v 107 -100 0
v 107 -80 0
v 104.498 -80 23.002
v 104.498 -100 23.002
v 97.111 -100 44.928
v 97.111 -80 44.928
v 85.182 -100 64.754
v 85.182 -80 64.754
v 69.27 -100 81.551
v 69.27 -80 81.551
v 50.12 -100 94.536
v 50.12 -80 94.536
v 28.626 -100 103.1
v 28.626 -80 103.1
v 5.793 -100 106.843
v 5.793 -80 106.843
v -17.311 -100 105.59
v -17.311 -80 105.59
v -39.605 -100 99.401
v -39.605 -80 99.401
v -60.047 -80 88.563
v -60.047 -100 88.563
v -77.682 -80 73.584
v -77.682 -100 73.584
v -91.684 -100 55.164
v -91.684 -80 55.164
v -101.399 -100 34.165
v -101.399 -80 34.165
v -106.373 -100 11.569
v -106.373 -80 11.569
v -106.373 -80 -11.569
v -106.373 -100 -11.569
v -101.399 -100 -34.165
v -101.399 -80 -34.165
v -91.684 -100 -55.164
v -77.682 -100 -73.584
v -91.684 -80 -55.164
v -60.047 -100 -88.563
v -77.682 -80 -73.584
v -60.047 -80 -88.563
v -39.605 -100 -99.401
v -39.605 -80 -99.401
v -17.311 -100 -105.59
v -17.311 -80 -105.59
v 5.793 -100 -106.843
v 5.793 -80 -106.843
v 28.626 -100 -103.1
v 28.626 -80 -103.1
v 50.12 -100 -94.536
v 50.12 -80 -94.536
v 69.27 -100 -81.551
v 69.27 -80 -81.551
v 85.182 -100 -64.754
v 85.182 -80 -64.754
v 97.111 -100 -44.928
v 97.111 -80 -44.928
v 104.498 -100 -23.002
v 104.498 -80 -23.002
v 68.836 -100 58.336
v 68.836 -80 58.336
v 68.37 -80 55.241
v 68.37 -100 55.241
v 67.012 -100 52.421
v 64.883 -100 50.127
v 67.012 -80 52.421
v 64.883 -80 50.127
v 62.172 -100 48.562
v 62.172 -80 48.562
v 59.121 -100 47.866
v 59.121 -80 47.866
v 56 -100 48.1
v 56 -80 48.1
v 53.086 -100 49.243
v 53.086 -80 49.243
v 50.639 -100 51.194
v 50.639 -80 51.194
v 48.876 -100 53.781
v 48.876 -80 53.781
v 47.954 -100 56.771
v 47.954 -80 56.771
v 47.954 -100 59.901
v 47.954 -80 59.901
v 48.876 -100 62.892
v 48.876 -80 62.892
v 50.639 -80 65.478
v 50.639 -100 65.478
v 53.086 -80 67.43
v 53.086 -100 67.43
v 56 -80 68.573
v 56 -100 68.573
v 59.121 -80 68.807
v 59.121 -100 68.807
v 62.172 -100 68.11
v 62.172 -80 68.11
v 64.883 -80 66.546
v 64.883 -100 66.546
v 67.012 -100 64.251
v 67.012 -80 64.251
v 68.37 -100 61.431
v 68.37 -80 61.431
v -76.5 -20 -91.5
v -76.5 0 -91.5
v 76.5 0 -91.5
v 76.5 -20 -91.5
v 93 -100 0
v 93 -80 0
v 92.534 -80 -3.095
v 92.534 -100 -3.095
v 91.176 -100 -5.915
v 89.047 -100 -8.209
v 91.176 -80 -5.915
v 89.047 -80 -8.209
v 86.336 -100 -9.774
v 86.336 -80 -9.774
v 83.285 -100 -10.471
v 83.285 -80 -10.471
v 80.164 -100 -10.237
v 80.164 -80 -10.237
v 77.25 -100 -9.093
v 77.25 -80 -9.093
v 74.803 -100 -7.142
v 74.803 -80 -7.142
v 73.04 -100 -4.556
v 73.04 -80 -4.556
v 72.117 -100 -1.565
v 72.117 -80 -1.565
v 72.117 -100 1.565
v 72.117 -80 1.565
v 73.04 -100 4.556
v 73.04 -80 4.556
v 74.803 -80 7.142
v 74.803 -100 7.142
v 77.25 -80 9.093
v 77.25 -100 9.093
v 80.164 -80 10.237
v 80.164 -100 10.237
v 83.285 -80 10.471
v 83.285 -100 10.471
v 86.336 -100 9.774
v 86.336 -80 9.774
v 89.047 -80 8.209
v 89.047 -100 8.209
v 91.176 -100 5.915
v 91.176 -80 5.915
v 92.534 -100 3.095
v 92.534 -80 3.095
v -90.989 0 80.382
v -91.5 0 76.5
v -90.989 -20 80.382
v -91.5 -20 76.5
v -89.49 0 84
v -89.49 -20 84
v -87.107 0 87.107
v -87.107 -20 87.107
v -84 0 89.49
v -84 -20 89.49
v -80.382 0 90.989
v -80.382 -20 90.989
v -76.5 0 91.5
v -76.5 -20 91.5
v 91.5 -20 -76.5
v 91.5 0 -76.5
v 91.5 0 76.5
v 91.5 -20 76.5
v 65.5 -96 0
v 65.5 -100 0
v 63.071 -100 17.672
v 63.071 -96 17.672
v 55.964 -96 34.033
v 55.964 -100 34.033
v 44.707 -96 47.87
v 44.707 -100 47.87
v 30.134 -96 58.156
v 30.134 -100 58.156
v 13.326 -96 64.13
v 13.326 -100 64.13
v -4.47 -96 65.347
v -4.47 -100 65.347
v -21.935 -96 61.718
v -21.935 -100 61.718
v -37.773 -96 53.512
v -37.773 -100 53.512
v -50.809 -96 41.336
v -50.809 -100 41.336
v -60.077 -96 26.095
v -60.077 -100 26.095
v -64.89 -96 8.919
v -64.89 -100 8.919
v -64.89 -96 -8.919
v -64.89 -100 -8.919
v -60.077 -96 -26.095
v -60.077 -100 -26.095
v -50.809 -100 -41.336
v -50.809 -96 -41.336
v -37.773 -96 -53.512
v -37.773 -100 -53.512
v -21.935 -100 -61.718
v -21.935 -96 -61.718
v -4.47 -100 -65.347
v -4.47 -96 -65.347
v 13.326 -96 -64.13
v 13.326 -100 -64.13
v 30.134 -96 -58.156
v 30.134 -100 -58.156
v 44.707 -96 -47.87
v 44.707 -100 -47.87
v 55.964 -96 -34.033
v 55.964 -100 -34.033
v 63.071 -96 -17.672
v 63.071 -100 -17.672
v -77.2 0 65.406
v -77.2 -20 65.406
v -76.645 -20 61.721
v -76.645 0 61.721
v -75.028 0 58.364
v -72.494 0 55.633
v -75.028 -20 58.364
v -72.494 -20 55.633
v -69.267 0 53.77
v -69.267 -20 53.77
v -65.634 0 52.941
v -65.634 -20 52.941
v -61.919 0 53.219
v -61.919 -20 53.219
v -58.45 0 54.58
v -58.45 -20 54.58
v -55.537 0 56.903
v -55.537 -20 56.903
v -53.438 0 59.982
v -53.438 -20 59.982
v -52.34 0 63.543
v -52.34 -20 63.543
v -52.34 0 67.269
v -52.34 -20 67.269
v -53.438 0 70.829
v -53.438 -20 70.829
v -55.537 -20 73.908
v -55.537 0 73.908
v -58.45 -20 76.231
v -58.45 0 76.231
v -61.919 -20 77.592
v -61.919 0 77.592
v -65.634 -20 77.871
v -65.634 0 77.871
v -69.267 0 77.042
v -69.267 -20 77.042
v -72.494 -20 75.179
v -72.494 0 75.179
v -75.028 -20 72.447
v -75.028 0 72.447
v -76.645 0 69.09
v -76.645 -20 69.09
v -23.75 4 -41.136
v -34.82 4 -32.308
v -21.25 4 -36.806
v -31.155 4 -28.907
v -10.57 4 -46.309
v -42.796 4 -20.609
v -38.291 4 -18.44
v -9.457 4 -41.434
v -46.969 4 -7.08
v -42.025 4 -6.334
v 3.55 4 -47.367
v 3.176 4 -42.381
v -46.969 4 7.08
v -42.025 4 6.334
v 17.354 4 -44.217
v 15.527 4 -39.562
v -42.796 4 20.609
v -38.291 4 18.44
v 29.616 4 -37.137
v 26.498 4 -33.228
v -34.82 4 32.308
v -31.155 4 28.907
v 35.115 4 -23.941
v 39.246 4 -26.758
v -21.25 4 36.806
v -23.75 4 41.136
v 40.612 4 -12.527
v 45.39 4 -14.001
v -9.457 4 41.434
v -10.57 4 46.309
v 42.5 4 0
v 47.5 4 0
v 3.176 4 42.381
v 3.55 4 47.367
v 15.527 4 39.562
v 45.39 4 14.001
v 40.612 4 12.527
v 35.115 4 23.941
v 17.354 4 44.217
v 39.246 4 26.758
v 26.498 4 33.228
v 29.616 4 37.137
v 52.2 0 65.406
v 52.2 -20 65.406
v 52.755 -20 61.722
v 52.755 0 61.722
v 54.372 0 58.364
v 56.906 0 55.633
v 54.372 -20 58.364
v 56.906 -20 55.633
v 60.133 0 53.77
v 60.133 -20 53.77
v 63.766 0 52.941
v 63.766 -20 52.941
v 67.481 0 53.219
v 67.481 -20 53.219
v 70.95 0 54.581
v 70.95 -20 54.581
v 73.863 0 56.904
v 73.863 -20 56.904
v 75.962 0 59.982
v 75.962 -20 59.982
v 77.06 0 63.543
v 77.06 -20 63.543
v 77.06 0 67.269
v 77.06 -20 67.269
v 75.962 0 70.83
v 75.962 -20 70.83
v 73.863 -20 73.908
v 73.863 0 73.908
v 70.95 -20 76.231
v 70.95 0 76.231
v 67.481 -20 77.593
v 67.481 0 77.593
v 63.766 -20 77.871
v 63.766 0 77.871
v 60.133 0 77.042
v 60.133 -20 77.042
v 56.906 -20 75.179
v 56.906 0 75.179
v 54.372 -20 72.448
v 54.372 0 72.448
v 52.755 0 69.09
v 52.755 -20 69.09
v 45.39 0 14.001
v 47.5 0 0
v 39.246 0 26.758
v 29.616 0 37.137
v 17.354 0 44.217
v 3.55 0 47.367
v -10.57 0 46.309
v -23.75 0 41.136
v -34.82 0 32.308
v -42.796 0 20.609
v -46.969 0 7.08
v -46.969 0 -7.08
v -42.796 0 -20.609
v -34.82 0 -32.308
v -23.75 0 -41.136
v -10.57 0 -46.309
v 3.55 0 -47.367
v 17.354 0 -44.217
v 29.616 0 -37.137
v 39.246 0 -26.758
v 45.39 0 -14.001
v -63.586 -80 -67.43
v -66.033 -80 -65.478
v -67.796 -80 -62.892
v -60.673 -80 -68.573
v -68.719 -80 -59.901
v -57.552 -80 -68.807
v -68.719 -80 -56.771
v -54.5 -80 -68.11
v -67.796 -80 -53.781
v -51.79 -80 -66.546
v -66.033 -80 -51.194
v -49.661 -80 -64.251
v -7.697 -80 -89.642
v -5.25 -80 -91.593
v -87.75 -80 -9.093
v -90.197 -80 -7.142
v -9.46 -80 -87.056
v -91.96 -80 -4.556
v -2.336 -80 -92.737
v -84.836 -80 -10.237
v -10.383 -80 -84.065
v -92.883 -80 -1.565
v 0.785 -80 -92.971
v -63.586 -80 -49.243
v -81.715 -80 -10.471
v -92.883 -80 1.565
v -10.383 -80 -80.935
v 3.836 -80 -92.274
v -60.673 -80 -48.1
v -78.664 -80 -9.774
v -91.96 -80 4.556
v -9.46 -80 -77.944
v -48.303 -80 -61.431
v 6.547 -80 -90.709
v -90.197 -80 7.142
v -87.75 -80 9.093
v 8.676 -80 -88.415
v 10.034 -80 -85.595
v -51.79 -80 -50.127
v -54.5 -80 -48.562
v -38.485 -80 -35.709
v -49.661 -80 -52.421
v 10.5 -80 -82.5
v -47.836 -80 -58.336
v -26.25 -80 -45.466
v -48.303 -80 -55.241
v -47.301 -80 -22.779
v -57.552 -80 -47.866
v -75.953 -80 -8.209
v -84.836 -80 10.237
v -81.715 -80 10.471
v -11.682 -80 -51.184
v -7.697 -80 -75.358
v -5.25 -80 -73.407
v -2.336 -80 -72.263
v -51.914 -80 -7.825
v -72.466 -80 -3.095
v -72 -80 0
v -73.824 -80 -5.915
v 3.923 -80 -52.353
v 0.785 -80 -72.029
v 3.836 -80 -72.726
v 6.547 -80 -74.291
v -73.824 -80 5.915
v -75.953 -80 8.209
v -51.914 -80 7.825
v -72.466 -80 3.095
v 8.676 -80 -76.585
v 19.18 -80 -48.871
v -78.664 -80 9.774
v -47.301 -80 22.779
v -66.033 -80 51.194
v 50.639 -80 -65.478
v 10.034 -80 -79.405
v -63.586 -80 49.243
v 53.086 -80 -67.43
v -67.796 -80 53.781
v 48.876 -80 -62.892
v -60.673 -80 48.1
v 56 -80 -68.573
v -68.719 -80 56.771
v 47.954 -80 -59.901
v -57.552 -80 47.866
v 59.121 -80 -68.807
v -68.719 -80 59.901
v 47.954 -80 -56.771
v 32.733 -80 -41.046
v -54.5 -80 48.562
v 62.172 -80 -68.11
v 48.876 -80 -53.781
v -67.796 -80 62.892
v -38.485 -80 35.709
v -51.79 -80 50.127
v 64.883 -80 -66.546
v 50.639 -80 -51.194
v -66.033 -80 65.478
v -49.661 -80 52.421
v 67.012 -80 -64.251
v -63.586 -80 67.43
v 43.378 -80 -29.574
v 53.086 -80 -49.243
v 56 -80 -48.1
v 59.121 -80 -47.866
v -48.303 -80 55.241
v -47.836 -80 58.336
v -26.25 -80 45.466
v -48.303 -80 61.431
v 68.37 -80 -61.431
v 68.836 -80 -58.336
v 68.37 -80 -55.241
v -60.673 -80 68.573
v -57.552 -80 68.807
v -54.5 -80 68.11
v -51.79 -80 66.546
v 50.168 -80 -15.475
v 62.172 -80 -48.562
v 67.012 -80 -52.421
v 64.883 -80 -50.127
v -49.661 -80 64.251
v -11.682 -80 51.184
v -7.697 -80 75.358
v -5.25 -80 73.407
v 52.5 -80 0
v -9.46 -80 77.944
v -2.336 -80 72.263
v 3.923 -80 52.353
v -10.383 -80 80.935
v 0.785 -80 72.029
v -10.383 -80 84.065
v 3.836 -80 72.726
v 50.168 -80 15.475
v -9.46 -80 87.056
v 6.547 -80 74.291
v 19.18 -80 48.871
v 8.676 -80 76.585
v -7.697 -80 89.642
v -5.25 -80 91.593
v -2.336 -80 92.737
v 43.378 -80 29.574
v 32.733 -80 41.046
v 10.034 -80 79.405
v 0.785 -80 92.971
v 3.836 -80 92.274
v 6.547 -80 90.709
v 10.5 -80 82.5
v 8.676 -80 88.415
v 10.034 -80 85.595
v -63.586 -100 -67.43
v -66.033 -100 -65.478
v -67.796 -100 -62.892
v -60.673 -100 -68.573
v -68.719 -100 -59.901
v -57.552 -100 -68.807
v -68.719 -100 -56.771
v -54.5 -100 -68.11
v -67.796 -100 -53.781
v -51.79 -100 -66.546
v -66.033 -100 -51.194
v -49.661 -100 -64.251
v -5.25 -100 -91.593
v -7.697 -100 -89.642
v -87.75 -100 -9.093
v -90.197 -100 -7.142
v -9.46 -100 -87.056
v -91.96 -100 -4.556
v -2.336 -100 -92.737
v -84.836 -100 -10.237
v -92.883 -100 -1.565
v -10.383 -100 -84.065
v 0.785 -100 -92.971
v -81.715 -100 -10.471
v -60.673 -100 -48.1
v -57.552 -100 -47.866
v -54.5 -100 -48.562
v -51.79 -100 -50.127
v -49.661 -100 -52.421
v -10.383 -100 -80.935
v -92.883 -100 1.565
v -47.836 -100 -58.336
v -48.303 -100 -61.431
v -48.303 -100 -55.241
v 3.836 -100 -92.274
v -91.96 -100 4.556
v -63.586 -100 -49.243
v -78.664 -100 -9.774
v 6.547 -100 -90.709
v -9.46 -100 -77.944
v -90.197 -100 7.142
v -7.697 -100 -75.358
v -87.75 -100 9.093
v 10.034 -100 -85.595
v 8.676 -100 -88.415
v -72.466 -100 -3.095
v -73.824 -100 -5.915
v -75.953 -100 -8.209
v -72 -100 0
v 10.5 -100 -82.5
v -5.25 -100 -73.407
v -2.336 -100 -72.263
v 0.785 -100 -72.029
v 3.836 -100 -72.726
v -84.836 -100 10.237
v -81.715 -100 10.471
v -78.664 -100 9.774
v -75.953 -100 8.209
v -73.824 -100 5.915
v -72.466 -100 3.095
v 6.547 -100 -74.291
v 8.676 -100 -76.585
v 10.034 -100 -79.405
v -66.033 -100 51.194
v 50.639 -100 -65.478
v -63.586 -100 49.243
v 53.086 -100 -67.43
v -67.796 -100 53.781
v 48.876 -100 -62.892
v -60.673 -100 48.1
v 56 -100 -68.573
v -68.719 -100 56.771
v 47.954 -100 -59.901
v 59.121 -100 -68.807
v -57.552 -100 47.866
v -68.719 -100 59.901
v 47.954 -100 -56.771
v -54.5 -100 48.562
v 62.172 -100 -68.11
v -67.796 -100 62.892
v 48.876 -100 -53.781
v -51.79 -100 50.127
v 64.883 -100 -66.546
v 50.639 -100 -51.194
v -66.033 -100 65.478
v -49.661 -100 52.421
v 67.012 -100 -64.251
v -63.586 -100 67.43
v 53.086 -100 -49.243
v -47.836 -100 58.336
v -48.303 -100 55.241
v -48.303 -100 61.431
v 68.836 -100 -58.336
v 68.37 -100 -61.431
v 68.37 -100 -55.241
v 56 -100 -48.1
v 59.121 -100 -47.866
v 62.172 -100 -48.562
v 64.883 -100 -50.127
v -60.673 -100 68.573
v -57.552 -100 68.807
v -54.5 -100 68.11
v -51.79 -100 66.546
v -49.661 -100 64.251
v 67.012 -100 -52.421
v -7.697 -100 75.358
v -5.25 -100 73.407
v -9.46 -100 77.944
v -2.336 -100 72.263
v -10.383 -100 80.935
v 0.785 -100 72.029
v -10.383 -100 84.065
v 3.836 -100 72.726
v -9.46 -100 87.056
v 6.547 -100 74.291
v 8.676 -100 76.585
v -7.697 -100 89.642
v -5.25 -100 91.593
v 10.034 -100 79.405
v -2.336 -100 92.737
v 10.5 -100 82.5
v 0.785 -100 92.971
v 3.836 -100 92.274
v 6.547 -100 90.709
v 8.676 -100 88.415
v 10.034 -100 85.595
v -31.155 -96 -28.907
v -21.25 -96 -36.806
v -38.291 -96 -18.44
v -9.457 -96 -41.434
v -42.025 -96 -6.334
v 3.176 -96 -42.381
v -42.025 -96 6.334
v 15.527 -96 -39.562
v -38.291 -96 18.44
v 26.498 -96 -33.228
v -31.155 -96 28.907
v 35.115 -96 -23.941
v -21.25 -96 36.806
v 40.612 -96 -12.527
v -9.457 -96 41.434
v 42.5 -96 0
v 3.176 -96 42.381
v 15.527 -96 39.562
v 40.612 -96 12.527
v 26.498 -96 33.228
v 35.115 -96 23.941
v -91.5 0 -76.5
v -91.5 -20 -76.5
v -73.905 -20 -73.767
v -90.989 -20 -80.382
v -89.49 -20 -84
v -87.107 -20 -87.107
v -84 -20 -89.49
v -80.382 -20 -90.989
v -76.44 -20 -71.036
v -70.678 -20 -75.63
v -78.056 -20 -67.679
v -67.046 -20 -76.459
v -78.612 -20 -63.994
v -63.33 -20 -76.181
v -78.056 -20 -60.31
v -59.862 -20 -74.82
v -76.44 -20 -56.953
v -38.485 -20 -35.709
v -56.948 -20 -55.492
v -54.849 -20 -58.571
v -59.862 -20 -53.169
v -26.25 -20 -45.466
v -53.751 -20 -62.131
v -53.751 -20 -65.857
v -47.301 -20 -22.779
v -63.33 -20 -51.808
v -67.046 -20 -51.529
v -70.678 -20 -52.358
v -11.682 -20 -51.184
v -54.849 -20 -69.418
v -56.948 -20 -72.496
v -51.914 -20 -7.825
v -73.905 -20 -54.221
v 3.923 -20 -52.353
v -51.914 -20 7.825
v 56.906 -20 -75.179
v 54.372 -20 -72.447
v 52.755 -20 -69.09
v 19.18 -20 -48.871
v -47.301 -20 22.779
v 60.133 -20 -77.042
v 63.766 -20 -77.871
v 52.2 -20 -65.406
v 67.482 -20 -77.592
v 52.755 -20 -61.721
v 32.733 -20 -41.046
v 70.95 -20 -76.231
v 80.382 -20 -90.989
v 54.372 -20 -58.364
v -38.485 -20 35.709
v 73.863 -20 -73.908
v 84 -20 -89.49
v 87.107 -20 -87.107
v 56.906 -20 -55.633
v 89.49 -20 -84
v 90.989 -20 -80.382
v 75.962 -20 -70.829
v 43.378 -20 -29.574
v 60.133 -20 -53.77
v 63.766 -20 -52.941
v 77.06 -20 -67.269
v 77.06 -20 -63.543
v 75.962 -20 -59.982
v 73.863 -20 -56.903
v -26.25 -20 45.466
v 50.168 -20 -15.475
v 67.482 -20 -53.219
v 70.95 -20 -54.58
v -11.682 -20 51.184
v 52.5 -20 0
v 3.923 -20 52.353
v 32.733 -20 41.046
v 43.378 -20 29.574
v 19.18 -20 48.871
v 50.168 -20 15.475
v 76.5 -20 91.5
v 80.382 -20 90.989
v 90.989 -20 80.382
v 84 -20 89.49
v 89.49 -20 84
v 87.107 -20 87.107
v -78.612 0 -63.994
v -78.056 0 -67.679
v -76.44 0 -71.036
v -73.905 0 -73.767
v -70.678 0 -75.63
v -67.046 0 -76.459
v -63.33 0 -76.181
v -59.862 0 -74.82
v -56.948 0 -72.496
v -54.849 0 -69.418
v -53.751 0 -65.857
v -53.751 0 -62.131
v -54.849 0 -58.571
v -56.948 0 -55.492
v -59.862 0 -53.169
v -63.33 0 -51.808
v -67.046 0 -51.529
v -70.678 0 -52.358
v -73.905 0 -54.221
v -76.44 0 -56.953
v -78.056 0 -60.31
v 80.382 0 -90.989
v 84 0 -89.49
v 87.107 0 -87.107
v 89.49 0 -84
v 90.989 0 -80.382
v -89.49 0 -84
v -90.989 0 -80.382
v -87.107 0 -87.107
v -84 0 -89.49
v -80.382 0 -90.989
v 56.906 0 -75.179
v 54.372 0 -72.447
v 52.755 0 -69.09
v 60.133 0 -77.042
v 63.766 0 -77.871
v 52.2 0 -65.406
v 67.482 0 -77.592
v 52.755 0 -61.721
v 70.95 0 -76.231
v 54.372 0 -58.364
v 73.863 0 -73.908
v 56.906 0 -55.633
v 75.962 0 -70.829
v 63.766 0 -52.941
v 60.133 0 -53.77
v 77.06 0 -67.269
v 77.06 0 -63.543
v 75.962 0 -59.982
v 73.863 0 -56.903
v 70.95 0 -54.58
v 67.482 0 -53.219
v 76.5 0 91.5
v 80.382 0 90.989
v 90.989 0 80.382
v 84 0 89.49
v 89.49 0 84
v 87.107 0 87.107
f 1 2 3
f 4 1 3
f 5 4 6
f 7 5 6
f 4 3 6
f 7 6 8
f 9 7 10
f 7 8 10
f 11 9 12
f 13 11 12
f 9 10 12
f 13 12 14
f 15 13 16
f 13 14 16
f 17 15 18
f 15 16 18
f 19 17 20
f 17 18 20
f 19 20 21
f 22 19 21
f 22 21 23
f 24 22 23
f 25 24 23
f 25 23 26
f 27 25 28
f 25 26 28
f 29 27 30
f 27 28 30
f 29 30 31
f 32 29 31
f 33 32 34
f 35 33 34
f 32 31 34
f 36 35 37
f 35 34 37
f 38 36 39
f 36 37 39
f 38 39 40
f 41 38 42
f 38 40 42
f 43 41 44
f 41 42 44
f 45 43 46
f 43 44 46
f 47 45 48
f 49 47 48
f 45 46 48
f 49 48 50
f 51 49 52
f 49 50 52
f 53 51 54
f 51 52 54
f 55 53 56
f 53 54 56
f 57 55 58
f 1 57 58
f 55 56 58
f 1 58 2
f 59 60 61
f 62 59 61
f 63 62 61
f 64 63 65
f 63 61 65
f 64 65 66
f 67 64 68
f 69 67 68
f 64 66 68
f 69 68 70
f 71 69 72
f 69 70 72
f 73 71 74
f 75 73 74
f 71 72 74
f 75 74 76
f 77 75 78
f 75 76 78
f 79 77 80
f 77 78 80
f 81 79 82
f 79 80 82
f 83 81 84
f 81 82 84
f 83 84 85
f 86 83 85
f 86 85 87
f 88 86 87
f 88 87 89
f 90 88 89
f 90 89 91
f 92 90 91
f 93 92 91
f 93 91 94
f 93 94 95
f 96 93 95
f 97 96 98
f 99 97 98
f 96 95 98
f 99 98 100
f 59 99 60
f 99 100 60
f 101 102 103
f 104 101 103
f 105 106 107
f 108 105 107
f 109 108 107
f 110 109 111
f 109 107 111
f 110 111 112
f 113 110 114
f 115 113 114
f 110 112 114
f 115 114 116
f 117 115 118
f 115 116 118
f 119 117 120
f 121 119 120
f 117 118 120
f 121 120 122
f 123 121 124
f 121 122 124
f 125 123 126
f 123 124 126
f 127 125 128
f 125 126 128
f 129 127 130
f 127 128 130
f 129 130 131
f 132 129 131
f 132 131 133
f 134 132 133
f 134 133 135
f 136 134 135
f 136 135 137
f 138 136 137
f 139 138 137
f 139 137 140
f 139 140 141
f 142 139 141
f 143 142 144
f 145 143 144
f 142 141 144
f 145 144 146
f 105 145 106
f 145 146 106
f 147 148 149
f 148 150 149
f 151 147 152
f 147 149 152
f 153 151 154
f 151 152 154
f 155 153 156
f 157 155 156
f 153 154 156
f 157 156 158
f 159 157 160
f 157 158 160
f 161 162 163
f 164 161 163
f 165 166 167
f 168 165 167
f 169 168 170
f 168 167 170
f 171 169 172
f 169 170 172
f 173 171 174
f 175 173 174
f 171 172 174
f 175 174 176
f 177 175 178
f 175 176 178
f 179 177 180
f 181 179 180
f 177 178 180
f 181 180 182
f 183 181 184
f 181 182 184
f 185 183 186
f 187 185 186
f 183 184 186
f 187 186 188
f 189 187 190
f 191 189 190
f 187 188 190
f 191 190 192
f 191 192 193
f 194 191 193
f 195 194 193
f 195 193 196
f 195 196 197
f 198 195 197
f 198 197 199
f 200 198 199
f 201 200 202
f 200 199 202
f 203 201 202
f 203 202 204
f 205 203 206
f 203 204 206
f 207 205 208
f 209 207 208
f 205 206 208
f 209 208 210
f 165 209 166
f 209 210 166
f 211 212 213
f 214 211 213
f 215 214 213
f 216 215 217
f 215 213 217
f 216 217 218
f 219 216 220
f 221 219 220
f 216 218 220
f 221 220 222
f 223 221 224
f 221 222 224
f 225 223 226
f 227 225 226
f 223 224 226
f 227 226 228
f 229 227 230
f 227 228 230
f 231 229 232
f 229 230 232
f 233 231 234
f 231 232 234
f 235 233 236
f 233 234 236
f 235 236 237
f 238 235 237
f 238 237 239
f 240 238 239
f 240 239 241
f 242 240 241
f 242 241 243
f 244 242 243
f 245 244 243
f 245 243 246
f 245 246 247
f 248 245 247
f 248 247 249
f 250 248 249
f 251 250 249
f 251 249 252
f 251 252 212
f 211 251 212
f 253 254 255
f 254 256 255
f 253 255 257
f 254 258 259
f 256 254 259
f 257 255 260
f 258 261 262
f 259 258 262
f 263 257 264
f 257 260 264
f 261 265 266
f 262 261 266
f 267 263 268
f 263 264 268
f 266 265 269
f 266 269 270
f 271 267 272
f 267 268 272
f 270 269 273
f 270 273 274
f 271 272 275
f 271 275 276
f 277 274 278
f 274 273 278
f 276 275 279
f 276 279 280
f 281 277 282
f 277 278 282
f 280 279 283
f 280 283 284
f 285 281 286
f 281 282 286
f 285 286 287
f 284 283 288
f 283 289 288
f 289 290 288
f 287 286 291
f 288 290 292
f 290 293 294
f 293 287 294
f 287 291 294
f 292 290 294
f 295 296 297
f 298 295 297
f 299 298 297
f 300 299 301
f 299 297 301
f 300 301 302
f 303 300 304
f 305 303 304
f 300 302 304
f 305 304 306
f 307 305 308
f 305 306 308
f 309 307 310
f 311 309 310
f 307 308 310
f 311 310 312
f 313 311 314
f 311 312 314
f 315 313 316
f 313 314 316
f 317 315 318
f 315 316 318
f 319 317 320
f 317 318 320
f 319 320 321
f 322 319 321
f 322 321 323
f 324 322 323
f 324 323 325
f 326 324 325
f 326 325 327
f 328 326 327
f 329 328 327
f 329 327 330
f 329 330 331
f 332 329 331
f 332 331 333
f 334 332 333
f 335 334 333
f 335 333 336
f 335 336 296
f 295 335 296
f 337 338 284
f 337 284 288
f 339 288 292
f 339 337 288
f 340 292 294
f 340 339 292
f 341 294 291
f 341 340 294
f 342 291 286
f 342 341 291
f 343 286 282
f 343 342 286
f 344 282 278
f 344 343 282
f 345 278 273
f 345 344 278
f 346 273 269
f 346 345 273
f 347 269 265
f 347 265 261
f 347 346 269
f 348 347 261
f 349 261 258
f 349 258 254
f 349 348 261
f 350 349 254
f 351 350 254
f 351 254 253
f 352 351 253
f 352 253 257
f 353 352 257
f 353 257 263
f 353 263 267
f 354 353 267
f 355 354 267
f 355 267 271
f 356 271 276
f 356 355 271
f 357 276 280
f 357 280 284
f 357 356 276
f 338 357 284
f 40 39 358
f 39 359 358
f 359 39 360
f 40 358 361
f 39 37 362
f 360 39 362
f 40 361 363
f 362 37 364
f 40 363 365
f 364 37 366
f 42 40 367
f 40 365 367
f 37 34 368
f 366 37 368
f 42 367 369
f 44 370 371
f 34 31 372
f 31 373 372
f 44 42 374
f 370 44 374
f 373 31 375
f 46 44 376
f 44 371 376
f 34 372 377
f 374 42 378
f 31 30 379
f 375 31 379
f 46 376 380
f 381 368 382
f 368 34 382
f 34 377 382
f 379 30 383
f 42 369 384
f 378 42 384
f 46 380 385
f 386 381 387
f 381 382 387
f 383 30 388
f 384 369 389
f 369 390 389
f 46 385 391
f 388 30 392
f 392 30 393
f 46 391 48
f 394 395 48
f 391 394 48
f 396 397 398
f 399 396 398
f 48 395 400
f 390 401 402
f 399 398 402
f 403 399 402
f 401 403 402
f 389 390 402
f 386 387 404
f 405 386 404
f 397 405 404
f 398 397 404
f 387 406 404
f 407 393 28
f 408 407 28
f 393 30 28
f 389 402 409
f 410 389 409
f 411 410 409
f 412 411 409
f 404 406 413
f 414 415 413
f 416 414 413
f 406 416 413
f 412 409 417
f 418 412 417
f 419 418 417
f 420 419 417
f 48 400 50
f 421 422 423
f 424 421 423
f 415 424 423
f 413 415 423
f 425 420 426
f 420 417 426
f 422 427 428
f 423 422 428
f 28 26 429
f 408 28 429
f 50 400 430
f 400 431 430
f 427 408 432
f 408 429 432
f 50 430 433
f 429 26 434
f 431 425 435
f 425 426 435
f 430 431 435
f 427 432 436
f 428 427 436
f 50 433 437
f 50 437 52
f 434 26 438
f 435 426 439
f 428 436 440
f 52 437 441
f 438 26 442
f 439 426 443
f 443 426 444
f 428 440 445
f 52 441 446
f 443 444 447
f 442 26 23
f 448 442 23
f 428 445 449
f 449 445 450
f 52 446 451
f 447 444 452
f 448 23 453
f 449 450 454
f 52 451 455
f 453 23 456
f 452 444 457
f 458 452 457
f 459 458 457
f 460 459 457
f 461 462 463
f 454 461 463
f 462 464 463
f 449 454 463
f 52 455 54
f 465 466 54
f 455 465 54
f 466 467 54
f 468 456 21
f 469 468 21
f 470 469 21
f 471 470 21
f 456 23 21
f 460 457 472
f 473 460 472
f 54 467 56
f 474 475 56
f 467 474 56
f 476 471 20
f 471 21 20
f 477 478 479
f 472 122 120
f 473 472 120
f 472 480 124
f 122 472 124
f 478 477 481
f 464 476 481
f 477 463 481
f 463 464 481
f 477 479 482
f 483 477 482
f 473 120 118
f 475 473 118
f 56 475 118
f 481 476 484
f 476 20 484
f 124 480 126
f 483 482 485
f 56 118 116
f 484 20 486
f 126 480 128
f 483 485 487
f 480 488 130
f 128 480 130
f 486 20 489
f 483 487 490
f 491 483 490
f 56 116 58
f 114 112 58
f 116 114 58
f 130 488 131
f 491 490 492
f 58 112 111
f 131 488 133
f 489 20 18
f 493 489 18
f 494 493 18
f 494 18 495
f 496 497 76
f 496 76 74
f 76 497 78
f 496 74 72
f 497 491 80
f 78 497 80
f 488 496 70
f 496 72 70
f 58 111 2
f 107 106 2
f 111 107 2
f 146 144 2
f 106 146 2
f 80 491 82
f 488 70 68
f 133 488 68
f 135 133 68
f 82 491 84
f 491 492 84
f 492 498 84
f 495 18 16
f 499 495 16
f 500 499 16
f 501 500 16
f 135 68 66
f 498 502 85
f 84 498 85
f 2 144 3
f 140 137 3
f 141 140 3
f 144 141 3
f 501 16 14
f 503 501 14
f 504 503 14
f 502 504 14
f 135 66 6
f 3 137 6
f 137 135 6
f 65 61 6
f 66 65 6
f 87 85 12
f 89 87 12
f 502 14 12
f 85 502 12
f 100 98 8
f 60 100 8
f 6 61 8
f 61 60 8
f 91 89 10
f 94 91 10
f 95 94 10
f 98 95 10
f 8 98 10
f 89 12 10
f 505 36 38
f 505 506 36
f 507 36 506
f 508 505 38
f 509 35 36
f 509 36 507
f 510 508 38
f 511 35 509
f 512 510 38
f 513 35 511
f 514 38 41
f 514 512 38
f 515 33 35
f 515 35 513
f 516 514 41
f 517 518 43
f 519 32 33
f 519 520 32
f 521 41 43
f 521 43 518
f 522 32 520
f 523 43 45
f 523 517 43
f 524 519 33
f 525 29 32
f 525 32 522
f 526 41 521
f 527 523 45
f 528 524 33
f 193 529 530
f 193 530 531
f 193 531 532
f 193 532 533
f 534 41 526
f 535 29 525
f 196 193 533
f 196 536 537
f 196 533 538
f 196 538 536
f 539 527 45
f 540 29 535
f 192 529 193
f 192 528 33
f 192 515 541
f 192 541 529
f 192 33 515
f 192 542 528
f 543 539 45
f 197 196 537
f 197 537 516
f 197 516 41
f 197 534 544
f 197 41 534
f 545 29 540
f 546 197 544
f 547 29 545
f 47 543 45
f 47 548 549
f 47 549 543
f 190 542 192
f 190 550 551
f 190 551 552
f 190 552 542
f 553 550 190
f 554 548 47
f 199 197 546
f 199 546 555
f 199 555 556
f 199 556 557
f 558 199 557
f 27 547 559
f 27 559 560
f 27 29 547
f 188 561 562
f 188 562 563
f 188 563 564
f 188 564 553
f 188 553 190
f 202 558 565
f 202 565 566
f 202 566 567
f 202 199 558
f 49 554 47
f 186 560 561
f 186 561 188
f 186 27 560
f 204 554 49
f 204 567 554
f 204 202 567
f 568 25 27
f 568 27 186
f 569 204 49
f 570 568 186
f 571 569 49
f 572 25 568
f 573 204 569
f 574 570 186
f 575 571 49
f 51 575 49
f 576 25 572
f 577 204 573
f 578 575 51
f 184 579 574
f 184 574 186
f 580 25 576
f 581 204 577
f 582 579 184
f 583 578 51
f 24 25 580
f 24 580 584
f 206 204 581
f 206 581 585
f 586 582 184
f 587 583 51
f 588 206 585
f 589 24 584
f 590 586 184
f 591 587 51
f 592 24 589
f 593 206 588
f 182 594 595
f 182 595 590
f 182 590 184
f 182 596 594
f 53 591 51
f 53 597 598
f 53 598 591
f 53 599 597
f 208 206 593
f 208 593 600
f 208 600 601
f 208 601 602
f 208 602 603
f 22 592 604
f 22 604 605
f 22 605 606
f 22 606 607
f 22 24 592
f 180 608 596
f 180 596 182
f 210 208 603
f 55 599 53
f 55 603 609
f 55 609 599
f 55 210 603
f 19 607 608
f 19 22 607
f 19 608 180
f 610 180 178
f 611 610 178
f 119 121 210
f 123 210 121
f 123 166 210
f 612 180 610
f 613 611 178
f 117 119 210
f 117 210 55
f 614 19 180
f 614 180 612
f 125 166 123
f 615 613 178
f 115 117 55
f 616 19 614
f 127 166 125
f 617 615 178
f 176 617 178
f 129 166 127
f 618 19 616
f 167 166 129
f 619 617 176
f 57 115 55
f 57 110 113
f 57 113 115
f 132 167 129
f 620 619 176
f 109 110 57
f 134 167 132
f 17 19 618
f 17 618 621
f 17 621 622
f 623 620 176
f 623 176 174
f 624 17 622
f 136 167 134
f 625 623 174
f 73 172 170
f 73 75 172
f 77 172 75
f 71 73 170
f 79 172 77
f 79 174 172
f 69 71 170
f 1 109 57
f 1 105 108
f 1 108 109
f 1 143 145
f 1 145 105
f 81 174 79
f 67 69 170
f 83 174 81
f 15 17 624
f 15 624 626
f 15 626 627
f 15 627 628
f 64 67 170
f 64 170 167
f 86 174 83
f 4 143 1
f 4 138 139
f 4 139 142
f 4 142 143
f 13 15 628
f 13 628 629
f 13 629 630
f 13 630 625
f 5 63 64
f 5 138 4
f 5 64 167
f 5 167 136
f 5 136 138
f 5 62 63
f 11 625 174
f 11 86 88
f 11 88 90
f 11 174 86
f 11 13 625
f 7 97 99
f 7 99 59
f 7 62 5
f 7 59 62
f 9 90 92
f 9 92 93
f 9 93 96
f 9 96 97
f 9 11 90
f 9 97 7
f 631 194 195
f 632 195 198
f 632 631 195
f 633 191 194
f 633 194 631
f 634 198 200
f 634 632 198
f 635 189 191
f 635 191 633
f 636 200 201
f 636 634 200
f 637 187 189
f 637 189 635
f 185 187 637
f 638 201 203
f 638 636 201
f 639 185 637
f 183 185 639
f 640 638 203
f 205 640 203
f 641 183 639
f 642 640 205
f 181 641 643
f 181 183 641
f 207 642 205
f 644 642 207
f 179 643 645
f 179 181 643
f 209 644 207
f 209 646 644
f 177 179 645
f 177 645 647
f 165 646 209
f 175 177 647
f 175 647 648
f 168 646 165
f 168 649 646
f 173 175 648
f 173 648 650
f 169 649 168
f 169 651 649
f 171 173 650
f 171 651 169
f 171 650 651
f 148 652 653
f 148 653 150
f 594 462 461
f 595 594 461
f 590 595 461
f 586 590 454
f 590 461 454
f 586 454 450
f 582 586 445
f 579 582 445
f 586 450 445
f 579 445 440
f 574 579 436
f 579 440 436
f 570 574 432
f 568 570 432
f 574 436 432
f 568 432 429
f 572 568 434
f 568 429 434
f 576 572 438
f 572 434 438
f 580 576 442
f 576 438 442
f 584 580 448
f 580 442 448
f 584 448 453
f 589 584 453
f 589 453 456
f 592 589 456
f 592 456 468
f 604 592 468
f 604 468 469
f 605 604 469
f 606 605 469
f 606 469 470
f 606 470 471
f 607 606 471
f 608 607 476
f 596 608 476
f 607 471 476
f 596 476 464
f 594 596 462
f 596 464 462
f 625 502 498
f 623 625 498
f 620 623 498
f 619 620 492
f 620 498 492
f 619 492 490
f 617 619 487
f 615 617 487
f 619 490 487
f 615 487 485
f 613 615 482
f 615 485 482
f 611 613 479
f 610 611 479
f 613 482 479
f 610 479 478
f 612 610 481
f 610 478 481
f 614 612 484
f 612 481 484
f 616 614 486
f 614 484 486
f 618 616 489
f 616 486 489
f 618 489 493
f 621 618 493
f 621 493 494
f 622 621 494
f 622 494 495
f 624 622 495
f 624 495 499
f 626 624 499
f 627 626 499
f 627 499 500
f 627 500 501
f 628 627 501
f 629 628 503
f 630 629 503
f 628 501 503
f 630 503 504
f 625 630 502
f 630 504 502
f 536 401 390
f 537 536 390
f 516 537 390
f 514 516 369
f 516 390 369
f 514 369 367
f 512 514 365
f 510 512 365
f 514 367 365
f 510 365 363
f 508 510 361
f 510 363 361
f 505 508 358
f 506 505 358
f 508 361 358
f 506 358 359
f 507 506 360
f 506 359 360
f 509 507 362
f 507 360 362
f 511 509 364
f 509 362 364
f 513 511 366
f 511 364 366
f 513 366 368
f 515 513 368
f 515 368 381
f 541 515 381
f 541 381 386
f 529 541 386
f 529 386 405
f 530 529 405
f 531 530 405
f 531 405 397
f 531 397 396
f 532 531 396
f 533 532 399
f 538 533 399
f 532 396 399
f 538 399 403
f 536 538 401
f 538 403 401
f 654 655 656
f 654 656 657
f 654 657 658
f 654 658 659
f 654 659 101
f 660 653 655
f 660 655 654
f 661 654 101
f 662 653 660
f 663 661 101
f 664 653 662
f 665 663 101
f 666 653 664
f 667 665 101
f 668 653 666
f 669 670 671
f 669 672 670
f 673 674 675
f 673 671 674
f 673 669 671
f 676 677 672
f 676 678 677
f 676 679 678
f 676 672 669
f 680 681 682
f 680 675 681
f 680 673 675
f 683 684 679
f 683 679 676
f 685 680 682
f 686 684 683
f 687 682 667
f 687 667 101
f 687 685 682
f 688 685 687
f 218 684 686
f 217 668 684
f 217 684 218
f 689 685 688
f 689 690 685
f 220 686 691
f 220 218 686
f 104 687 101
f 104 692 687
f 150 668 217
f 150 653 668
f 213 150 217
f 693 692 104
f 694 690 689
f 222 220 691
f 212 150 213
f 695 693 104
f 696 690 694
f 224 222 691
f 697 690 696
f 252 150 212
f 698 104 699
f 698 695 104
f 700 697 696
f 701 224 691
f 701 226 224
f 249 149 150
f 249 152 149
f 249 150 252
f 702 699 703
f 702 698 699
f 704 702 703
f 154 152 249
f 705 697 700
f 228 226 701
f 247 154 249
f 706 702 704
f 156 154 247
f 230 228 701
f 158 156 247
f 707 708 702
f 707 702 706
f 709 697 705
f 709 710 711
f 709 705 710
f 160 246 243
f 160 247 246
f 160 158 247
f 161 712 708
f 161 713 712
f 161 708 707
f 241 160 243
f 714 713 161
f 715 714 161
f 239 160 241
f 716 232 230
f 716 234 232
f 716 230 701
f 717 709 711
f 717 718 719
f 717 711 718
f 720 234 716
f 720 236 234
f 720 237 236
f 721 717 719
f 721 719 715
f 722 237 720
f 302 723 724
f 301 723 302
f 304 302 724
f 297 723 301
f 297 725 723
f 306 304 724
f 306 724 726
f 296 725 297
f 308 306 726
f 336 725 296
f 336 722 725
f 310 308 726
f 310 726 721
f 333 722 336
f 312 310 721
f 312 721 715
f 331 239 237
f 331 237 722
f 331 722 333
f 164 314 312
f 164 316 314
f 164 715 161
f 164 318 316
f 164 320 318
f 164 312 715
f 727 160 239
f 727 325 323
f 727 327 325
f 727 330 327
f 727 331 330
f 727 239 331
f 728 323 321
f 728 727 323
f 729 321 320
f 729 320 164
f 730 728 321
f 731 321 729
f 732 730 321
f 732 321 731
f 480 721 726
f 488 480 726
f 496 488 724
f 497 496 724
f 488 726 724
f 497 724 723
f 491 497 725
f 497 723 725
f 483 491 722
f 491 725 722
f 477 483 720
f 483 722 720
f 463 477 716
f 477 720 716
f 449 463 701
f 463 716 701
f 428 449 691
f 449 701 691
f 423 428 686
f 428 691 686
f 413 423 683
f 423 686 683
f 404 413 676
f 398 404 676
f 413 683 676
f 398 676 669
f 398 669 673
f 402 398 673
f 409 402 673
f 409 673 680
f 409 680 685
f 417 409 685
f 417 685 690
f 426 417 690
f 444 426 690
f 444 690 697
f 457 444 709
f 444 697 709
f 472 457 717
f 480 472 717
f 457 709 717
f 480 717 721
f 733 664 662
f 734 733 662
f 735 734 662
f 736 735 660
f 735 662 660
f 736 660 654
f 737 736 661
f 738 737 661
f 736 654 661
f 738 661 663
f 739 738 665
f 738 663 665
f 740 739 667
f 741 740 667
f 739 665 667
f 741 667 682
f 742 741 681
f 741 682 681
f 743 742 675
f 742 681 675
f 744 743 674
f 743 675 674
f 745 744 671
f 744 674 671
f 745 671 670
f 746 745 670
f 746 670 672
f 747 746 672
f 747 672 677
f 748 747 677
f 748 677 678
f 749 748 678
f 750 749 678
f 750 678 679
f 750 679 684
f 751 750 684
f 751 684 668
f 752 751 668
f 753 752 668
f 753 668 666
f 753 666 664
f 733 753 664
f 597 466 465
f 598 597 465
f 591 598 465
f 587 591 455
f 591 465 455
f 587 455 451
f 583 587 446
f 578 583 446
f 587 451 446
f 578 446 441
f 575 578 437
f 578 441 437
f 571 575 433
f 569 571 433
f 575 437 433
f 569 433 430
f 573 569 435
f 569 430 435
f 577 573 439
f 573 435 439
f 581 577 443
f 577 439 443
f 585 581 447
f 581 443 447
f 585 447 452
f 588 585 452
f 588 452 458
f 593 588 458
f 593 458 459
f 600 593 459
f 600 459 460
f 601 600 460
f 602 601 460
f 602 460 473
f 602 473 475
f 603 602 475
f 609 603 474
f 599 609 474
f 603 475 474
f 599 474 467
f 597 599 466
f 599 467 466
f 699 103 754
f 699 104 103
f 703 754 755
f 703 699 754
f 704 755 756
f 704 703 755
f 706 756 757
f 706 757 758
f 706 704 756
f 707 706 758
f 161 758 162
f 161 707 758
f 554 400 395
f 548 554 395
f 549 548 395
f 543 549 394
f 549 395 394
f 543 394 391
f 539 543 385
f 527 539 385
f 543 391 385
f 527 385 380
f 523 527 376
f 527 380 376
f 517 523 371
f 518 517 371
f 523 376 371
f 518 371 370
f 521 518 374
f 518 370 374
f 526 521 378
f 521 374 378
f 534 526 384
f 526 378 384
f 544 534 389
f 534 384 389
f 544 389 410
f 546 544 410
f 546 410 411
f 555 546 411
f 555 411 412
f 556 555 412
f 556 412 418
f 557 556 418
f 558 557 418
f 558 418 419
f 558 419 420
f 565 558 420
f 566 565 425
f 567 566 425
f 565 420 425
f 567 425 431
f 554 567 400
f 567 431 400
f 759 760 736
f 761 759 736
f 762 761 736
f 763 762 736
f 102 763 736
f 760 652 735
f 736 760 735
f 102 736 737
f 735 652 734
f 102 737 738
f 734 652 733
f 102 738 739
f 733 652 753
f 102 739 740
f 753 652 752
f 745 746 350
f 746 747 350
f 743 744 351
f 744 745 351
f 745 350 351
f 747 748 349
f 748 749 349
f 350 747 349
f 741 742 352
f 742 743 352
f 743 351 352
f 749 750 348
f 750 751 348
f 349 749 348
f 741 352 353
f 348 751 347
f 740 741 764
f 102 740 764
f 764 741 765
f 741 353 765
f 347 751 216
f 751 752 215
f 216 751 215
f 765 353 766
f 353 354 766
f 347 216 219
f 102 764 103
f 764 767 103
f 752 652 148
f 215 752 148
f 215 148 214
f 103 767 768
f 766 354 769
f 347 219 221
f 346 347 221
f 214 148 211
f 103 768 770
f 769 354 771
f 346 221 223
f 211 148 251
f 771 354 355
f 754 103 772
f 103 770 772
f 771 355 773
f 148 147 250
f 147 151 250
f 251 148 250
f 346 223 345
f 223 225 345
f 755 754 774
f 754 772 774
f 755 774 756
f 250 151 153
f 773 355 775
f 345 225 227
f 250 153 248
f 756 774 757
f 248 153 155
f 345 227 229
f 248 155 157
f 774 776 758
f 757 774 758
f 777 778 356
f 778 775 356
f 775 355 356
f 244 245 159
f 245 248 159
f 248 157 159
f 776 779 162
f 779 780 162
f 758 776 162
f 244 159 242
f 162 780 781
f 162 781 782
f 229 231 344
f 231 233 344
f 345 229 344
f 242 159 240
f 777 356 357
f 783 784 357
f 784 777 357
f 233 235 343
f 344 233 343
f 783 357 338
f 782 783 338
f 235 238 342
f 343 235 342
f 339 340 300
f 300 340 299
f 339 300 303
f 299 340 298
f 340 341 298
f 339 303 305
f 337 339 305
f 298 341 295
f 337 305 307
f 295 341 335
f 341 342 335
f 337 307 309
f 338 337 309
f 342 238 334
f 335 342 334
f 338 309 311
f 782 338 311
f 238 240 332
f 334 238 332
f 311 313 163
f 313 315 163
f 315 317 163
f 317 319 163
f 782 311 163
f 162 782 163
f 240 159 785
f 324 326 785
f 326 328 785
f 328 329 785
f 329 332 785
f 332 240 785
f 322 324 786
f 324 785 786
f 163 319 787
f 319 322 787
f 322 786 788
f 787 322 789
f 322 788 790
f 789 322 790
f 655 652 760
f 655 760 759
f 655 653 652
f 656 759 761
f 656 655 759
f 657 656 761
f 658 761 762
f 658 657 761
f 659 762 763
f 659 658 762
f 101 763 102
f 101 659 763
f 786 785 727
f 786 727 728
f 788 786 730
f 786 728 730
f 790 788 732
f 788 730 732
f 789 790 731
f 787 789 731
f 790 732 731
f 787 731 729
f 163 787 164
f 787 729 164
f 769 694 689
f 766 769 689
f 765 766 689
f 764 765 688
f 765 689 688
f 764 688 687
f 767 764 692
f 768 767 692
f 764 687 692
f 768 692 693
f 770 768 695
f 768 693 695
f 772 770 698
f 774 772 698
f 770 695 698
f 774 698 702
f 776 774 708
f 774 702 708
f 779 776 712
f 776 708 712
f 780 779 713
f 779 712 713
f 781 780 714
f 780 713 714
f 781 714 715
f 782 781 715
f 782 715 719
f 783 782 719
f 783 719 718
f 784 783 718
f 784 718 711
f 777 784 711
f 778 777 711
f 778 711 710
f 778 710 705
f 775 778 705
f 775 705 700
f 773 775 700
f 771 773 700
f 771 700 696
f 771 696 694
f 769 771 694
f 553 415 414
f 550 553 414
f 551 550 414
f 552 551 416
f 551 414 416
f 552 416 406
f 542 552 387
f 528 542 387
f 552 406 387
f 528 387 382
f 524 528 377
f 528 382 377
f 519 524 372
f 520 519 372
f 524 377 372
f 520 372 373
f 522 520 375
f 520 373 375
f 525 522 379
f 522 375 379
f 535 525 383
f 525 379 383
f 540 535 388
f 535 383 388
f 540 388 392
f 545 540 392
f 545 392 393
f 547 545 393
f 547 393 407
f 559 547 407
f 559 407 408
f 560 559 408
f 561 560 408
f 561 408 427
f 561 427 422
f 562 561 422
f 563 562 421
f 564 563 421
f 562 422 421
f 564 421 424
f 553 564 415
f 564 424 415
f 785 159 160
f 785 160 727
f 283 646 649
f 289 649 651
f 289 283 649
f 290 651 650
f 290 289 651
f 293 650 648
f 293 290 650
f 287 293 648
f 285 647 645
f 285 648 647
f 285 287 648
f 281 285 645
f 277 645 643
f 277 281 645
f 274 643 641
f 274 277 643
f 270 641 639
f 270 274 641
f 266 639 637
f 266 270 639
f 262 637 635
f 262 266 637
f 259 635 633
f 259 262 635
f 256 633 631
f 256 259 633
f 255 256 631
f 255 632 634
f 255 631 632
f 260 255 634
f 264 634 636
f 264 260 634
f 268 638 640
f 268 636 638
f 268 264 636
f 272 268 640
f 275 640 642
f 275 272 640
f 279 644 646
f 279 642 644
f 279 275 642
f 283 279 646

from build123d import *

# Parameters (mm, degrees)
F0_W      = 183
F0_H      = 183
F0_R      = 42.5
F1_DEPTH  = 20
F2_R      = 15
F3_D      = 25
F3_DEPTH  = 31
F3_TIP    = 7.5107577378
F4_R      = 47.5
F4_R_2    = 42.5
F5_DEPTH  = 4
F6_R      = 52.5
F6_R_2    = 42.5
F7_DEPTH  = 60
F8_R      = 107
F8_R_2    = 42.5
F9_DEPTH  = 20
F10_D     = 21
F10_DEPTH = 20
F10_TIP   = 6.3090364998
F11_R     = 65.5
F12_DEPTH = 4


with BuildPart() as f1:
    # F0 (on Front) → F1 (new body)
    with BuildSketch(Plane.XZ):
        Rectangle(F0_W, F0_H)
        Circle(F0_R, mode=Mode.SUBTRACT)
    extrude(amount=F1_DEPTH)

    # F2
    f2_edges = [f1.edges().sort_by_distance(p)[0] for p in [
        (-91.5, -10, 91.5),
        (91.5, -10, 91.5),
        (91.5, -10, -91.5),
        (-91.5, -10, -91.5),
    ]]
    fillet(f2_edges, radius=F2_R)

    # F3
    with Locations(Plane(origin=(0, 0, 0), x_dir=(1, 0, 0), z_dir=(0, 1, 0))):
        with Locations((64.7000986303, 65.4056361274), (64.6997307877, -65.406), (-64.7000986303, -65.4056361274), (-66.1115414671, 63.9941972606)):
            Hole(F3_D / 2, depth=F3_DEPTH)
            with Locations((0, 0, -(F3_DEPTH + F3_TIP / 2))):  # 118° drill point
                Cone(0, F3_D / 2, F3_TIP, mode=Mode.SUBTRACT)

    # F4 (on face) → F5 (join)
    with BuildSketch(Plane.XZ):
        Circle(F4_R)
        Circle(F4_R_2, mode=Mode.SUBTRACT)
    extrude(amount=-F5_DEPTH)

    # F6 (on face) → F7 (join)
    with BuildSketch(Plane.XZ.offset(20)):
        Circle(F6_R)
        Circle(F6_R_2, mode=Mode.SUBTRACT)
    extrude(amount=F7_DEPTH)

    # F8 (on face) → F9 (join)
    with BuildSketch(Plane.XZ.offset(80)):
        Circle(F8_R)
        Circle(F8_R_2, mode=Mode.SUBTRACT)
    extrude(amount=F9_DEPTH)

    # F10 (one way)
    with BuildSketch(Plane(origin=(0, -80, 0), x_dir=(1, 0, 0), z_dir=(0, 1, 0))):
        with Locations((82.5, 0), (58.3363094479, -58.3363094479), (0, -82.5), (-58.3363094479, -58.3363094479), (-82.5, 0), (-58.3363094479, 58.3363094479), (0, 82.5), (58.3363094479, 58.3363094479)):
            Circle(F10_D / 2)
    extrude(amount=-F10_DEPTH, mode=Mode.SUBTRACT)
    with Locations(Plane(origin=(0, -80, 0), x_dir=(1, 0, 0), z_dir=(0, 1, 0))):
        with Locations((82.5, 0), (58.3363094479, -58.3363094479), (0, -82.5), (-58.3363094479, -58.3363094479), (-82.5, 0), (-58.3363094479, 58.3363094479), (0, 82.5), (58.3363094479, 58.3363094479)):
            with Locations((0, 0, -(F10_DEPTH + F10_TIP / 2))):  # 118° drill point
                Cone(0, F10_D / 2, F10_TIP, mode=Mode.SUBTRACT)

    # F11 (on face) → F12 (cut)
    with BuildSketch(Plane.XZ.offset(100)):
        Circle(F11_R)
    extrude(amount=-F12_DEPTH, mode=Mode.SUBTRACT)


solid = f1.part
